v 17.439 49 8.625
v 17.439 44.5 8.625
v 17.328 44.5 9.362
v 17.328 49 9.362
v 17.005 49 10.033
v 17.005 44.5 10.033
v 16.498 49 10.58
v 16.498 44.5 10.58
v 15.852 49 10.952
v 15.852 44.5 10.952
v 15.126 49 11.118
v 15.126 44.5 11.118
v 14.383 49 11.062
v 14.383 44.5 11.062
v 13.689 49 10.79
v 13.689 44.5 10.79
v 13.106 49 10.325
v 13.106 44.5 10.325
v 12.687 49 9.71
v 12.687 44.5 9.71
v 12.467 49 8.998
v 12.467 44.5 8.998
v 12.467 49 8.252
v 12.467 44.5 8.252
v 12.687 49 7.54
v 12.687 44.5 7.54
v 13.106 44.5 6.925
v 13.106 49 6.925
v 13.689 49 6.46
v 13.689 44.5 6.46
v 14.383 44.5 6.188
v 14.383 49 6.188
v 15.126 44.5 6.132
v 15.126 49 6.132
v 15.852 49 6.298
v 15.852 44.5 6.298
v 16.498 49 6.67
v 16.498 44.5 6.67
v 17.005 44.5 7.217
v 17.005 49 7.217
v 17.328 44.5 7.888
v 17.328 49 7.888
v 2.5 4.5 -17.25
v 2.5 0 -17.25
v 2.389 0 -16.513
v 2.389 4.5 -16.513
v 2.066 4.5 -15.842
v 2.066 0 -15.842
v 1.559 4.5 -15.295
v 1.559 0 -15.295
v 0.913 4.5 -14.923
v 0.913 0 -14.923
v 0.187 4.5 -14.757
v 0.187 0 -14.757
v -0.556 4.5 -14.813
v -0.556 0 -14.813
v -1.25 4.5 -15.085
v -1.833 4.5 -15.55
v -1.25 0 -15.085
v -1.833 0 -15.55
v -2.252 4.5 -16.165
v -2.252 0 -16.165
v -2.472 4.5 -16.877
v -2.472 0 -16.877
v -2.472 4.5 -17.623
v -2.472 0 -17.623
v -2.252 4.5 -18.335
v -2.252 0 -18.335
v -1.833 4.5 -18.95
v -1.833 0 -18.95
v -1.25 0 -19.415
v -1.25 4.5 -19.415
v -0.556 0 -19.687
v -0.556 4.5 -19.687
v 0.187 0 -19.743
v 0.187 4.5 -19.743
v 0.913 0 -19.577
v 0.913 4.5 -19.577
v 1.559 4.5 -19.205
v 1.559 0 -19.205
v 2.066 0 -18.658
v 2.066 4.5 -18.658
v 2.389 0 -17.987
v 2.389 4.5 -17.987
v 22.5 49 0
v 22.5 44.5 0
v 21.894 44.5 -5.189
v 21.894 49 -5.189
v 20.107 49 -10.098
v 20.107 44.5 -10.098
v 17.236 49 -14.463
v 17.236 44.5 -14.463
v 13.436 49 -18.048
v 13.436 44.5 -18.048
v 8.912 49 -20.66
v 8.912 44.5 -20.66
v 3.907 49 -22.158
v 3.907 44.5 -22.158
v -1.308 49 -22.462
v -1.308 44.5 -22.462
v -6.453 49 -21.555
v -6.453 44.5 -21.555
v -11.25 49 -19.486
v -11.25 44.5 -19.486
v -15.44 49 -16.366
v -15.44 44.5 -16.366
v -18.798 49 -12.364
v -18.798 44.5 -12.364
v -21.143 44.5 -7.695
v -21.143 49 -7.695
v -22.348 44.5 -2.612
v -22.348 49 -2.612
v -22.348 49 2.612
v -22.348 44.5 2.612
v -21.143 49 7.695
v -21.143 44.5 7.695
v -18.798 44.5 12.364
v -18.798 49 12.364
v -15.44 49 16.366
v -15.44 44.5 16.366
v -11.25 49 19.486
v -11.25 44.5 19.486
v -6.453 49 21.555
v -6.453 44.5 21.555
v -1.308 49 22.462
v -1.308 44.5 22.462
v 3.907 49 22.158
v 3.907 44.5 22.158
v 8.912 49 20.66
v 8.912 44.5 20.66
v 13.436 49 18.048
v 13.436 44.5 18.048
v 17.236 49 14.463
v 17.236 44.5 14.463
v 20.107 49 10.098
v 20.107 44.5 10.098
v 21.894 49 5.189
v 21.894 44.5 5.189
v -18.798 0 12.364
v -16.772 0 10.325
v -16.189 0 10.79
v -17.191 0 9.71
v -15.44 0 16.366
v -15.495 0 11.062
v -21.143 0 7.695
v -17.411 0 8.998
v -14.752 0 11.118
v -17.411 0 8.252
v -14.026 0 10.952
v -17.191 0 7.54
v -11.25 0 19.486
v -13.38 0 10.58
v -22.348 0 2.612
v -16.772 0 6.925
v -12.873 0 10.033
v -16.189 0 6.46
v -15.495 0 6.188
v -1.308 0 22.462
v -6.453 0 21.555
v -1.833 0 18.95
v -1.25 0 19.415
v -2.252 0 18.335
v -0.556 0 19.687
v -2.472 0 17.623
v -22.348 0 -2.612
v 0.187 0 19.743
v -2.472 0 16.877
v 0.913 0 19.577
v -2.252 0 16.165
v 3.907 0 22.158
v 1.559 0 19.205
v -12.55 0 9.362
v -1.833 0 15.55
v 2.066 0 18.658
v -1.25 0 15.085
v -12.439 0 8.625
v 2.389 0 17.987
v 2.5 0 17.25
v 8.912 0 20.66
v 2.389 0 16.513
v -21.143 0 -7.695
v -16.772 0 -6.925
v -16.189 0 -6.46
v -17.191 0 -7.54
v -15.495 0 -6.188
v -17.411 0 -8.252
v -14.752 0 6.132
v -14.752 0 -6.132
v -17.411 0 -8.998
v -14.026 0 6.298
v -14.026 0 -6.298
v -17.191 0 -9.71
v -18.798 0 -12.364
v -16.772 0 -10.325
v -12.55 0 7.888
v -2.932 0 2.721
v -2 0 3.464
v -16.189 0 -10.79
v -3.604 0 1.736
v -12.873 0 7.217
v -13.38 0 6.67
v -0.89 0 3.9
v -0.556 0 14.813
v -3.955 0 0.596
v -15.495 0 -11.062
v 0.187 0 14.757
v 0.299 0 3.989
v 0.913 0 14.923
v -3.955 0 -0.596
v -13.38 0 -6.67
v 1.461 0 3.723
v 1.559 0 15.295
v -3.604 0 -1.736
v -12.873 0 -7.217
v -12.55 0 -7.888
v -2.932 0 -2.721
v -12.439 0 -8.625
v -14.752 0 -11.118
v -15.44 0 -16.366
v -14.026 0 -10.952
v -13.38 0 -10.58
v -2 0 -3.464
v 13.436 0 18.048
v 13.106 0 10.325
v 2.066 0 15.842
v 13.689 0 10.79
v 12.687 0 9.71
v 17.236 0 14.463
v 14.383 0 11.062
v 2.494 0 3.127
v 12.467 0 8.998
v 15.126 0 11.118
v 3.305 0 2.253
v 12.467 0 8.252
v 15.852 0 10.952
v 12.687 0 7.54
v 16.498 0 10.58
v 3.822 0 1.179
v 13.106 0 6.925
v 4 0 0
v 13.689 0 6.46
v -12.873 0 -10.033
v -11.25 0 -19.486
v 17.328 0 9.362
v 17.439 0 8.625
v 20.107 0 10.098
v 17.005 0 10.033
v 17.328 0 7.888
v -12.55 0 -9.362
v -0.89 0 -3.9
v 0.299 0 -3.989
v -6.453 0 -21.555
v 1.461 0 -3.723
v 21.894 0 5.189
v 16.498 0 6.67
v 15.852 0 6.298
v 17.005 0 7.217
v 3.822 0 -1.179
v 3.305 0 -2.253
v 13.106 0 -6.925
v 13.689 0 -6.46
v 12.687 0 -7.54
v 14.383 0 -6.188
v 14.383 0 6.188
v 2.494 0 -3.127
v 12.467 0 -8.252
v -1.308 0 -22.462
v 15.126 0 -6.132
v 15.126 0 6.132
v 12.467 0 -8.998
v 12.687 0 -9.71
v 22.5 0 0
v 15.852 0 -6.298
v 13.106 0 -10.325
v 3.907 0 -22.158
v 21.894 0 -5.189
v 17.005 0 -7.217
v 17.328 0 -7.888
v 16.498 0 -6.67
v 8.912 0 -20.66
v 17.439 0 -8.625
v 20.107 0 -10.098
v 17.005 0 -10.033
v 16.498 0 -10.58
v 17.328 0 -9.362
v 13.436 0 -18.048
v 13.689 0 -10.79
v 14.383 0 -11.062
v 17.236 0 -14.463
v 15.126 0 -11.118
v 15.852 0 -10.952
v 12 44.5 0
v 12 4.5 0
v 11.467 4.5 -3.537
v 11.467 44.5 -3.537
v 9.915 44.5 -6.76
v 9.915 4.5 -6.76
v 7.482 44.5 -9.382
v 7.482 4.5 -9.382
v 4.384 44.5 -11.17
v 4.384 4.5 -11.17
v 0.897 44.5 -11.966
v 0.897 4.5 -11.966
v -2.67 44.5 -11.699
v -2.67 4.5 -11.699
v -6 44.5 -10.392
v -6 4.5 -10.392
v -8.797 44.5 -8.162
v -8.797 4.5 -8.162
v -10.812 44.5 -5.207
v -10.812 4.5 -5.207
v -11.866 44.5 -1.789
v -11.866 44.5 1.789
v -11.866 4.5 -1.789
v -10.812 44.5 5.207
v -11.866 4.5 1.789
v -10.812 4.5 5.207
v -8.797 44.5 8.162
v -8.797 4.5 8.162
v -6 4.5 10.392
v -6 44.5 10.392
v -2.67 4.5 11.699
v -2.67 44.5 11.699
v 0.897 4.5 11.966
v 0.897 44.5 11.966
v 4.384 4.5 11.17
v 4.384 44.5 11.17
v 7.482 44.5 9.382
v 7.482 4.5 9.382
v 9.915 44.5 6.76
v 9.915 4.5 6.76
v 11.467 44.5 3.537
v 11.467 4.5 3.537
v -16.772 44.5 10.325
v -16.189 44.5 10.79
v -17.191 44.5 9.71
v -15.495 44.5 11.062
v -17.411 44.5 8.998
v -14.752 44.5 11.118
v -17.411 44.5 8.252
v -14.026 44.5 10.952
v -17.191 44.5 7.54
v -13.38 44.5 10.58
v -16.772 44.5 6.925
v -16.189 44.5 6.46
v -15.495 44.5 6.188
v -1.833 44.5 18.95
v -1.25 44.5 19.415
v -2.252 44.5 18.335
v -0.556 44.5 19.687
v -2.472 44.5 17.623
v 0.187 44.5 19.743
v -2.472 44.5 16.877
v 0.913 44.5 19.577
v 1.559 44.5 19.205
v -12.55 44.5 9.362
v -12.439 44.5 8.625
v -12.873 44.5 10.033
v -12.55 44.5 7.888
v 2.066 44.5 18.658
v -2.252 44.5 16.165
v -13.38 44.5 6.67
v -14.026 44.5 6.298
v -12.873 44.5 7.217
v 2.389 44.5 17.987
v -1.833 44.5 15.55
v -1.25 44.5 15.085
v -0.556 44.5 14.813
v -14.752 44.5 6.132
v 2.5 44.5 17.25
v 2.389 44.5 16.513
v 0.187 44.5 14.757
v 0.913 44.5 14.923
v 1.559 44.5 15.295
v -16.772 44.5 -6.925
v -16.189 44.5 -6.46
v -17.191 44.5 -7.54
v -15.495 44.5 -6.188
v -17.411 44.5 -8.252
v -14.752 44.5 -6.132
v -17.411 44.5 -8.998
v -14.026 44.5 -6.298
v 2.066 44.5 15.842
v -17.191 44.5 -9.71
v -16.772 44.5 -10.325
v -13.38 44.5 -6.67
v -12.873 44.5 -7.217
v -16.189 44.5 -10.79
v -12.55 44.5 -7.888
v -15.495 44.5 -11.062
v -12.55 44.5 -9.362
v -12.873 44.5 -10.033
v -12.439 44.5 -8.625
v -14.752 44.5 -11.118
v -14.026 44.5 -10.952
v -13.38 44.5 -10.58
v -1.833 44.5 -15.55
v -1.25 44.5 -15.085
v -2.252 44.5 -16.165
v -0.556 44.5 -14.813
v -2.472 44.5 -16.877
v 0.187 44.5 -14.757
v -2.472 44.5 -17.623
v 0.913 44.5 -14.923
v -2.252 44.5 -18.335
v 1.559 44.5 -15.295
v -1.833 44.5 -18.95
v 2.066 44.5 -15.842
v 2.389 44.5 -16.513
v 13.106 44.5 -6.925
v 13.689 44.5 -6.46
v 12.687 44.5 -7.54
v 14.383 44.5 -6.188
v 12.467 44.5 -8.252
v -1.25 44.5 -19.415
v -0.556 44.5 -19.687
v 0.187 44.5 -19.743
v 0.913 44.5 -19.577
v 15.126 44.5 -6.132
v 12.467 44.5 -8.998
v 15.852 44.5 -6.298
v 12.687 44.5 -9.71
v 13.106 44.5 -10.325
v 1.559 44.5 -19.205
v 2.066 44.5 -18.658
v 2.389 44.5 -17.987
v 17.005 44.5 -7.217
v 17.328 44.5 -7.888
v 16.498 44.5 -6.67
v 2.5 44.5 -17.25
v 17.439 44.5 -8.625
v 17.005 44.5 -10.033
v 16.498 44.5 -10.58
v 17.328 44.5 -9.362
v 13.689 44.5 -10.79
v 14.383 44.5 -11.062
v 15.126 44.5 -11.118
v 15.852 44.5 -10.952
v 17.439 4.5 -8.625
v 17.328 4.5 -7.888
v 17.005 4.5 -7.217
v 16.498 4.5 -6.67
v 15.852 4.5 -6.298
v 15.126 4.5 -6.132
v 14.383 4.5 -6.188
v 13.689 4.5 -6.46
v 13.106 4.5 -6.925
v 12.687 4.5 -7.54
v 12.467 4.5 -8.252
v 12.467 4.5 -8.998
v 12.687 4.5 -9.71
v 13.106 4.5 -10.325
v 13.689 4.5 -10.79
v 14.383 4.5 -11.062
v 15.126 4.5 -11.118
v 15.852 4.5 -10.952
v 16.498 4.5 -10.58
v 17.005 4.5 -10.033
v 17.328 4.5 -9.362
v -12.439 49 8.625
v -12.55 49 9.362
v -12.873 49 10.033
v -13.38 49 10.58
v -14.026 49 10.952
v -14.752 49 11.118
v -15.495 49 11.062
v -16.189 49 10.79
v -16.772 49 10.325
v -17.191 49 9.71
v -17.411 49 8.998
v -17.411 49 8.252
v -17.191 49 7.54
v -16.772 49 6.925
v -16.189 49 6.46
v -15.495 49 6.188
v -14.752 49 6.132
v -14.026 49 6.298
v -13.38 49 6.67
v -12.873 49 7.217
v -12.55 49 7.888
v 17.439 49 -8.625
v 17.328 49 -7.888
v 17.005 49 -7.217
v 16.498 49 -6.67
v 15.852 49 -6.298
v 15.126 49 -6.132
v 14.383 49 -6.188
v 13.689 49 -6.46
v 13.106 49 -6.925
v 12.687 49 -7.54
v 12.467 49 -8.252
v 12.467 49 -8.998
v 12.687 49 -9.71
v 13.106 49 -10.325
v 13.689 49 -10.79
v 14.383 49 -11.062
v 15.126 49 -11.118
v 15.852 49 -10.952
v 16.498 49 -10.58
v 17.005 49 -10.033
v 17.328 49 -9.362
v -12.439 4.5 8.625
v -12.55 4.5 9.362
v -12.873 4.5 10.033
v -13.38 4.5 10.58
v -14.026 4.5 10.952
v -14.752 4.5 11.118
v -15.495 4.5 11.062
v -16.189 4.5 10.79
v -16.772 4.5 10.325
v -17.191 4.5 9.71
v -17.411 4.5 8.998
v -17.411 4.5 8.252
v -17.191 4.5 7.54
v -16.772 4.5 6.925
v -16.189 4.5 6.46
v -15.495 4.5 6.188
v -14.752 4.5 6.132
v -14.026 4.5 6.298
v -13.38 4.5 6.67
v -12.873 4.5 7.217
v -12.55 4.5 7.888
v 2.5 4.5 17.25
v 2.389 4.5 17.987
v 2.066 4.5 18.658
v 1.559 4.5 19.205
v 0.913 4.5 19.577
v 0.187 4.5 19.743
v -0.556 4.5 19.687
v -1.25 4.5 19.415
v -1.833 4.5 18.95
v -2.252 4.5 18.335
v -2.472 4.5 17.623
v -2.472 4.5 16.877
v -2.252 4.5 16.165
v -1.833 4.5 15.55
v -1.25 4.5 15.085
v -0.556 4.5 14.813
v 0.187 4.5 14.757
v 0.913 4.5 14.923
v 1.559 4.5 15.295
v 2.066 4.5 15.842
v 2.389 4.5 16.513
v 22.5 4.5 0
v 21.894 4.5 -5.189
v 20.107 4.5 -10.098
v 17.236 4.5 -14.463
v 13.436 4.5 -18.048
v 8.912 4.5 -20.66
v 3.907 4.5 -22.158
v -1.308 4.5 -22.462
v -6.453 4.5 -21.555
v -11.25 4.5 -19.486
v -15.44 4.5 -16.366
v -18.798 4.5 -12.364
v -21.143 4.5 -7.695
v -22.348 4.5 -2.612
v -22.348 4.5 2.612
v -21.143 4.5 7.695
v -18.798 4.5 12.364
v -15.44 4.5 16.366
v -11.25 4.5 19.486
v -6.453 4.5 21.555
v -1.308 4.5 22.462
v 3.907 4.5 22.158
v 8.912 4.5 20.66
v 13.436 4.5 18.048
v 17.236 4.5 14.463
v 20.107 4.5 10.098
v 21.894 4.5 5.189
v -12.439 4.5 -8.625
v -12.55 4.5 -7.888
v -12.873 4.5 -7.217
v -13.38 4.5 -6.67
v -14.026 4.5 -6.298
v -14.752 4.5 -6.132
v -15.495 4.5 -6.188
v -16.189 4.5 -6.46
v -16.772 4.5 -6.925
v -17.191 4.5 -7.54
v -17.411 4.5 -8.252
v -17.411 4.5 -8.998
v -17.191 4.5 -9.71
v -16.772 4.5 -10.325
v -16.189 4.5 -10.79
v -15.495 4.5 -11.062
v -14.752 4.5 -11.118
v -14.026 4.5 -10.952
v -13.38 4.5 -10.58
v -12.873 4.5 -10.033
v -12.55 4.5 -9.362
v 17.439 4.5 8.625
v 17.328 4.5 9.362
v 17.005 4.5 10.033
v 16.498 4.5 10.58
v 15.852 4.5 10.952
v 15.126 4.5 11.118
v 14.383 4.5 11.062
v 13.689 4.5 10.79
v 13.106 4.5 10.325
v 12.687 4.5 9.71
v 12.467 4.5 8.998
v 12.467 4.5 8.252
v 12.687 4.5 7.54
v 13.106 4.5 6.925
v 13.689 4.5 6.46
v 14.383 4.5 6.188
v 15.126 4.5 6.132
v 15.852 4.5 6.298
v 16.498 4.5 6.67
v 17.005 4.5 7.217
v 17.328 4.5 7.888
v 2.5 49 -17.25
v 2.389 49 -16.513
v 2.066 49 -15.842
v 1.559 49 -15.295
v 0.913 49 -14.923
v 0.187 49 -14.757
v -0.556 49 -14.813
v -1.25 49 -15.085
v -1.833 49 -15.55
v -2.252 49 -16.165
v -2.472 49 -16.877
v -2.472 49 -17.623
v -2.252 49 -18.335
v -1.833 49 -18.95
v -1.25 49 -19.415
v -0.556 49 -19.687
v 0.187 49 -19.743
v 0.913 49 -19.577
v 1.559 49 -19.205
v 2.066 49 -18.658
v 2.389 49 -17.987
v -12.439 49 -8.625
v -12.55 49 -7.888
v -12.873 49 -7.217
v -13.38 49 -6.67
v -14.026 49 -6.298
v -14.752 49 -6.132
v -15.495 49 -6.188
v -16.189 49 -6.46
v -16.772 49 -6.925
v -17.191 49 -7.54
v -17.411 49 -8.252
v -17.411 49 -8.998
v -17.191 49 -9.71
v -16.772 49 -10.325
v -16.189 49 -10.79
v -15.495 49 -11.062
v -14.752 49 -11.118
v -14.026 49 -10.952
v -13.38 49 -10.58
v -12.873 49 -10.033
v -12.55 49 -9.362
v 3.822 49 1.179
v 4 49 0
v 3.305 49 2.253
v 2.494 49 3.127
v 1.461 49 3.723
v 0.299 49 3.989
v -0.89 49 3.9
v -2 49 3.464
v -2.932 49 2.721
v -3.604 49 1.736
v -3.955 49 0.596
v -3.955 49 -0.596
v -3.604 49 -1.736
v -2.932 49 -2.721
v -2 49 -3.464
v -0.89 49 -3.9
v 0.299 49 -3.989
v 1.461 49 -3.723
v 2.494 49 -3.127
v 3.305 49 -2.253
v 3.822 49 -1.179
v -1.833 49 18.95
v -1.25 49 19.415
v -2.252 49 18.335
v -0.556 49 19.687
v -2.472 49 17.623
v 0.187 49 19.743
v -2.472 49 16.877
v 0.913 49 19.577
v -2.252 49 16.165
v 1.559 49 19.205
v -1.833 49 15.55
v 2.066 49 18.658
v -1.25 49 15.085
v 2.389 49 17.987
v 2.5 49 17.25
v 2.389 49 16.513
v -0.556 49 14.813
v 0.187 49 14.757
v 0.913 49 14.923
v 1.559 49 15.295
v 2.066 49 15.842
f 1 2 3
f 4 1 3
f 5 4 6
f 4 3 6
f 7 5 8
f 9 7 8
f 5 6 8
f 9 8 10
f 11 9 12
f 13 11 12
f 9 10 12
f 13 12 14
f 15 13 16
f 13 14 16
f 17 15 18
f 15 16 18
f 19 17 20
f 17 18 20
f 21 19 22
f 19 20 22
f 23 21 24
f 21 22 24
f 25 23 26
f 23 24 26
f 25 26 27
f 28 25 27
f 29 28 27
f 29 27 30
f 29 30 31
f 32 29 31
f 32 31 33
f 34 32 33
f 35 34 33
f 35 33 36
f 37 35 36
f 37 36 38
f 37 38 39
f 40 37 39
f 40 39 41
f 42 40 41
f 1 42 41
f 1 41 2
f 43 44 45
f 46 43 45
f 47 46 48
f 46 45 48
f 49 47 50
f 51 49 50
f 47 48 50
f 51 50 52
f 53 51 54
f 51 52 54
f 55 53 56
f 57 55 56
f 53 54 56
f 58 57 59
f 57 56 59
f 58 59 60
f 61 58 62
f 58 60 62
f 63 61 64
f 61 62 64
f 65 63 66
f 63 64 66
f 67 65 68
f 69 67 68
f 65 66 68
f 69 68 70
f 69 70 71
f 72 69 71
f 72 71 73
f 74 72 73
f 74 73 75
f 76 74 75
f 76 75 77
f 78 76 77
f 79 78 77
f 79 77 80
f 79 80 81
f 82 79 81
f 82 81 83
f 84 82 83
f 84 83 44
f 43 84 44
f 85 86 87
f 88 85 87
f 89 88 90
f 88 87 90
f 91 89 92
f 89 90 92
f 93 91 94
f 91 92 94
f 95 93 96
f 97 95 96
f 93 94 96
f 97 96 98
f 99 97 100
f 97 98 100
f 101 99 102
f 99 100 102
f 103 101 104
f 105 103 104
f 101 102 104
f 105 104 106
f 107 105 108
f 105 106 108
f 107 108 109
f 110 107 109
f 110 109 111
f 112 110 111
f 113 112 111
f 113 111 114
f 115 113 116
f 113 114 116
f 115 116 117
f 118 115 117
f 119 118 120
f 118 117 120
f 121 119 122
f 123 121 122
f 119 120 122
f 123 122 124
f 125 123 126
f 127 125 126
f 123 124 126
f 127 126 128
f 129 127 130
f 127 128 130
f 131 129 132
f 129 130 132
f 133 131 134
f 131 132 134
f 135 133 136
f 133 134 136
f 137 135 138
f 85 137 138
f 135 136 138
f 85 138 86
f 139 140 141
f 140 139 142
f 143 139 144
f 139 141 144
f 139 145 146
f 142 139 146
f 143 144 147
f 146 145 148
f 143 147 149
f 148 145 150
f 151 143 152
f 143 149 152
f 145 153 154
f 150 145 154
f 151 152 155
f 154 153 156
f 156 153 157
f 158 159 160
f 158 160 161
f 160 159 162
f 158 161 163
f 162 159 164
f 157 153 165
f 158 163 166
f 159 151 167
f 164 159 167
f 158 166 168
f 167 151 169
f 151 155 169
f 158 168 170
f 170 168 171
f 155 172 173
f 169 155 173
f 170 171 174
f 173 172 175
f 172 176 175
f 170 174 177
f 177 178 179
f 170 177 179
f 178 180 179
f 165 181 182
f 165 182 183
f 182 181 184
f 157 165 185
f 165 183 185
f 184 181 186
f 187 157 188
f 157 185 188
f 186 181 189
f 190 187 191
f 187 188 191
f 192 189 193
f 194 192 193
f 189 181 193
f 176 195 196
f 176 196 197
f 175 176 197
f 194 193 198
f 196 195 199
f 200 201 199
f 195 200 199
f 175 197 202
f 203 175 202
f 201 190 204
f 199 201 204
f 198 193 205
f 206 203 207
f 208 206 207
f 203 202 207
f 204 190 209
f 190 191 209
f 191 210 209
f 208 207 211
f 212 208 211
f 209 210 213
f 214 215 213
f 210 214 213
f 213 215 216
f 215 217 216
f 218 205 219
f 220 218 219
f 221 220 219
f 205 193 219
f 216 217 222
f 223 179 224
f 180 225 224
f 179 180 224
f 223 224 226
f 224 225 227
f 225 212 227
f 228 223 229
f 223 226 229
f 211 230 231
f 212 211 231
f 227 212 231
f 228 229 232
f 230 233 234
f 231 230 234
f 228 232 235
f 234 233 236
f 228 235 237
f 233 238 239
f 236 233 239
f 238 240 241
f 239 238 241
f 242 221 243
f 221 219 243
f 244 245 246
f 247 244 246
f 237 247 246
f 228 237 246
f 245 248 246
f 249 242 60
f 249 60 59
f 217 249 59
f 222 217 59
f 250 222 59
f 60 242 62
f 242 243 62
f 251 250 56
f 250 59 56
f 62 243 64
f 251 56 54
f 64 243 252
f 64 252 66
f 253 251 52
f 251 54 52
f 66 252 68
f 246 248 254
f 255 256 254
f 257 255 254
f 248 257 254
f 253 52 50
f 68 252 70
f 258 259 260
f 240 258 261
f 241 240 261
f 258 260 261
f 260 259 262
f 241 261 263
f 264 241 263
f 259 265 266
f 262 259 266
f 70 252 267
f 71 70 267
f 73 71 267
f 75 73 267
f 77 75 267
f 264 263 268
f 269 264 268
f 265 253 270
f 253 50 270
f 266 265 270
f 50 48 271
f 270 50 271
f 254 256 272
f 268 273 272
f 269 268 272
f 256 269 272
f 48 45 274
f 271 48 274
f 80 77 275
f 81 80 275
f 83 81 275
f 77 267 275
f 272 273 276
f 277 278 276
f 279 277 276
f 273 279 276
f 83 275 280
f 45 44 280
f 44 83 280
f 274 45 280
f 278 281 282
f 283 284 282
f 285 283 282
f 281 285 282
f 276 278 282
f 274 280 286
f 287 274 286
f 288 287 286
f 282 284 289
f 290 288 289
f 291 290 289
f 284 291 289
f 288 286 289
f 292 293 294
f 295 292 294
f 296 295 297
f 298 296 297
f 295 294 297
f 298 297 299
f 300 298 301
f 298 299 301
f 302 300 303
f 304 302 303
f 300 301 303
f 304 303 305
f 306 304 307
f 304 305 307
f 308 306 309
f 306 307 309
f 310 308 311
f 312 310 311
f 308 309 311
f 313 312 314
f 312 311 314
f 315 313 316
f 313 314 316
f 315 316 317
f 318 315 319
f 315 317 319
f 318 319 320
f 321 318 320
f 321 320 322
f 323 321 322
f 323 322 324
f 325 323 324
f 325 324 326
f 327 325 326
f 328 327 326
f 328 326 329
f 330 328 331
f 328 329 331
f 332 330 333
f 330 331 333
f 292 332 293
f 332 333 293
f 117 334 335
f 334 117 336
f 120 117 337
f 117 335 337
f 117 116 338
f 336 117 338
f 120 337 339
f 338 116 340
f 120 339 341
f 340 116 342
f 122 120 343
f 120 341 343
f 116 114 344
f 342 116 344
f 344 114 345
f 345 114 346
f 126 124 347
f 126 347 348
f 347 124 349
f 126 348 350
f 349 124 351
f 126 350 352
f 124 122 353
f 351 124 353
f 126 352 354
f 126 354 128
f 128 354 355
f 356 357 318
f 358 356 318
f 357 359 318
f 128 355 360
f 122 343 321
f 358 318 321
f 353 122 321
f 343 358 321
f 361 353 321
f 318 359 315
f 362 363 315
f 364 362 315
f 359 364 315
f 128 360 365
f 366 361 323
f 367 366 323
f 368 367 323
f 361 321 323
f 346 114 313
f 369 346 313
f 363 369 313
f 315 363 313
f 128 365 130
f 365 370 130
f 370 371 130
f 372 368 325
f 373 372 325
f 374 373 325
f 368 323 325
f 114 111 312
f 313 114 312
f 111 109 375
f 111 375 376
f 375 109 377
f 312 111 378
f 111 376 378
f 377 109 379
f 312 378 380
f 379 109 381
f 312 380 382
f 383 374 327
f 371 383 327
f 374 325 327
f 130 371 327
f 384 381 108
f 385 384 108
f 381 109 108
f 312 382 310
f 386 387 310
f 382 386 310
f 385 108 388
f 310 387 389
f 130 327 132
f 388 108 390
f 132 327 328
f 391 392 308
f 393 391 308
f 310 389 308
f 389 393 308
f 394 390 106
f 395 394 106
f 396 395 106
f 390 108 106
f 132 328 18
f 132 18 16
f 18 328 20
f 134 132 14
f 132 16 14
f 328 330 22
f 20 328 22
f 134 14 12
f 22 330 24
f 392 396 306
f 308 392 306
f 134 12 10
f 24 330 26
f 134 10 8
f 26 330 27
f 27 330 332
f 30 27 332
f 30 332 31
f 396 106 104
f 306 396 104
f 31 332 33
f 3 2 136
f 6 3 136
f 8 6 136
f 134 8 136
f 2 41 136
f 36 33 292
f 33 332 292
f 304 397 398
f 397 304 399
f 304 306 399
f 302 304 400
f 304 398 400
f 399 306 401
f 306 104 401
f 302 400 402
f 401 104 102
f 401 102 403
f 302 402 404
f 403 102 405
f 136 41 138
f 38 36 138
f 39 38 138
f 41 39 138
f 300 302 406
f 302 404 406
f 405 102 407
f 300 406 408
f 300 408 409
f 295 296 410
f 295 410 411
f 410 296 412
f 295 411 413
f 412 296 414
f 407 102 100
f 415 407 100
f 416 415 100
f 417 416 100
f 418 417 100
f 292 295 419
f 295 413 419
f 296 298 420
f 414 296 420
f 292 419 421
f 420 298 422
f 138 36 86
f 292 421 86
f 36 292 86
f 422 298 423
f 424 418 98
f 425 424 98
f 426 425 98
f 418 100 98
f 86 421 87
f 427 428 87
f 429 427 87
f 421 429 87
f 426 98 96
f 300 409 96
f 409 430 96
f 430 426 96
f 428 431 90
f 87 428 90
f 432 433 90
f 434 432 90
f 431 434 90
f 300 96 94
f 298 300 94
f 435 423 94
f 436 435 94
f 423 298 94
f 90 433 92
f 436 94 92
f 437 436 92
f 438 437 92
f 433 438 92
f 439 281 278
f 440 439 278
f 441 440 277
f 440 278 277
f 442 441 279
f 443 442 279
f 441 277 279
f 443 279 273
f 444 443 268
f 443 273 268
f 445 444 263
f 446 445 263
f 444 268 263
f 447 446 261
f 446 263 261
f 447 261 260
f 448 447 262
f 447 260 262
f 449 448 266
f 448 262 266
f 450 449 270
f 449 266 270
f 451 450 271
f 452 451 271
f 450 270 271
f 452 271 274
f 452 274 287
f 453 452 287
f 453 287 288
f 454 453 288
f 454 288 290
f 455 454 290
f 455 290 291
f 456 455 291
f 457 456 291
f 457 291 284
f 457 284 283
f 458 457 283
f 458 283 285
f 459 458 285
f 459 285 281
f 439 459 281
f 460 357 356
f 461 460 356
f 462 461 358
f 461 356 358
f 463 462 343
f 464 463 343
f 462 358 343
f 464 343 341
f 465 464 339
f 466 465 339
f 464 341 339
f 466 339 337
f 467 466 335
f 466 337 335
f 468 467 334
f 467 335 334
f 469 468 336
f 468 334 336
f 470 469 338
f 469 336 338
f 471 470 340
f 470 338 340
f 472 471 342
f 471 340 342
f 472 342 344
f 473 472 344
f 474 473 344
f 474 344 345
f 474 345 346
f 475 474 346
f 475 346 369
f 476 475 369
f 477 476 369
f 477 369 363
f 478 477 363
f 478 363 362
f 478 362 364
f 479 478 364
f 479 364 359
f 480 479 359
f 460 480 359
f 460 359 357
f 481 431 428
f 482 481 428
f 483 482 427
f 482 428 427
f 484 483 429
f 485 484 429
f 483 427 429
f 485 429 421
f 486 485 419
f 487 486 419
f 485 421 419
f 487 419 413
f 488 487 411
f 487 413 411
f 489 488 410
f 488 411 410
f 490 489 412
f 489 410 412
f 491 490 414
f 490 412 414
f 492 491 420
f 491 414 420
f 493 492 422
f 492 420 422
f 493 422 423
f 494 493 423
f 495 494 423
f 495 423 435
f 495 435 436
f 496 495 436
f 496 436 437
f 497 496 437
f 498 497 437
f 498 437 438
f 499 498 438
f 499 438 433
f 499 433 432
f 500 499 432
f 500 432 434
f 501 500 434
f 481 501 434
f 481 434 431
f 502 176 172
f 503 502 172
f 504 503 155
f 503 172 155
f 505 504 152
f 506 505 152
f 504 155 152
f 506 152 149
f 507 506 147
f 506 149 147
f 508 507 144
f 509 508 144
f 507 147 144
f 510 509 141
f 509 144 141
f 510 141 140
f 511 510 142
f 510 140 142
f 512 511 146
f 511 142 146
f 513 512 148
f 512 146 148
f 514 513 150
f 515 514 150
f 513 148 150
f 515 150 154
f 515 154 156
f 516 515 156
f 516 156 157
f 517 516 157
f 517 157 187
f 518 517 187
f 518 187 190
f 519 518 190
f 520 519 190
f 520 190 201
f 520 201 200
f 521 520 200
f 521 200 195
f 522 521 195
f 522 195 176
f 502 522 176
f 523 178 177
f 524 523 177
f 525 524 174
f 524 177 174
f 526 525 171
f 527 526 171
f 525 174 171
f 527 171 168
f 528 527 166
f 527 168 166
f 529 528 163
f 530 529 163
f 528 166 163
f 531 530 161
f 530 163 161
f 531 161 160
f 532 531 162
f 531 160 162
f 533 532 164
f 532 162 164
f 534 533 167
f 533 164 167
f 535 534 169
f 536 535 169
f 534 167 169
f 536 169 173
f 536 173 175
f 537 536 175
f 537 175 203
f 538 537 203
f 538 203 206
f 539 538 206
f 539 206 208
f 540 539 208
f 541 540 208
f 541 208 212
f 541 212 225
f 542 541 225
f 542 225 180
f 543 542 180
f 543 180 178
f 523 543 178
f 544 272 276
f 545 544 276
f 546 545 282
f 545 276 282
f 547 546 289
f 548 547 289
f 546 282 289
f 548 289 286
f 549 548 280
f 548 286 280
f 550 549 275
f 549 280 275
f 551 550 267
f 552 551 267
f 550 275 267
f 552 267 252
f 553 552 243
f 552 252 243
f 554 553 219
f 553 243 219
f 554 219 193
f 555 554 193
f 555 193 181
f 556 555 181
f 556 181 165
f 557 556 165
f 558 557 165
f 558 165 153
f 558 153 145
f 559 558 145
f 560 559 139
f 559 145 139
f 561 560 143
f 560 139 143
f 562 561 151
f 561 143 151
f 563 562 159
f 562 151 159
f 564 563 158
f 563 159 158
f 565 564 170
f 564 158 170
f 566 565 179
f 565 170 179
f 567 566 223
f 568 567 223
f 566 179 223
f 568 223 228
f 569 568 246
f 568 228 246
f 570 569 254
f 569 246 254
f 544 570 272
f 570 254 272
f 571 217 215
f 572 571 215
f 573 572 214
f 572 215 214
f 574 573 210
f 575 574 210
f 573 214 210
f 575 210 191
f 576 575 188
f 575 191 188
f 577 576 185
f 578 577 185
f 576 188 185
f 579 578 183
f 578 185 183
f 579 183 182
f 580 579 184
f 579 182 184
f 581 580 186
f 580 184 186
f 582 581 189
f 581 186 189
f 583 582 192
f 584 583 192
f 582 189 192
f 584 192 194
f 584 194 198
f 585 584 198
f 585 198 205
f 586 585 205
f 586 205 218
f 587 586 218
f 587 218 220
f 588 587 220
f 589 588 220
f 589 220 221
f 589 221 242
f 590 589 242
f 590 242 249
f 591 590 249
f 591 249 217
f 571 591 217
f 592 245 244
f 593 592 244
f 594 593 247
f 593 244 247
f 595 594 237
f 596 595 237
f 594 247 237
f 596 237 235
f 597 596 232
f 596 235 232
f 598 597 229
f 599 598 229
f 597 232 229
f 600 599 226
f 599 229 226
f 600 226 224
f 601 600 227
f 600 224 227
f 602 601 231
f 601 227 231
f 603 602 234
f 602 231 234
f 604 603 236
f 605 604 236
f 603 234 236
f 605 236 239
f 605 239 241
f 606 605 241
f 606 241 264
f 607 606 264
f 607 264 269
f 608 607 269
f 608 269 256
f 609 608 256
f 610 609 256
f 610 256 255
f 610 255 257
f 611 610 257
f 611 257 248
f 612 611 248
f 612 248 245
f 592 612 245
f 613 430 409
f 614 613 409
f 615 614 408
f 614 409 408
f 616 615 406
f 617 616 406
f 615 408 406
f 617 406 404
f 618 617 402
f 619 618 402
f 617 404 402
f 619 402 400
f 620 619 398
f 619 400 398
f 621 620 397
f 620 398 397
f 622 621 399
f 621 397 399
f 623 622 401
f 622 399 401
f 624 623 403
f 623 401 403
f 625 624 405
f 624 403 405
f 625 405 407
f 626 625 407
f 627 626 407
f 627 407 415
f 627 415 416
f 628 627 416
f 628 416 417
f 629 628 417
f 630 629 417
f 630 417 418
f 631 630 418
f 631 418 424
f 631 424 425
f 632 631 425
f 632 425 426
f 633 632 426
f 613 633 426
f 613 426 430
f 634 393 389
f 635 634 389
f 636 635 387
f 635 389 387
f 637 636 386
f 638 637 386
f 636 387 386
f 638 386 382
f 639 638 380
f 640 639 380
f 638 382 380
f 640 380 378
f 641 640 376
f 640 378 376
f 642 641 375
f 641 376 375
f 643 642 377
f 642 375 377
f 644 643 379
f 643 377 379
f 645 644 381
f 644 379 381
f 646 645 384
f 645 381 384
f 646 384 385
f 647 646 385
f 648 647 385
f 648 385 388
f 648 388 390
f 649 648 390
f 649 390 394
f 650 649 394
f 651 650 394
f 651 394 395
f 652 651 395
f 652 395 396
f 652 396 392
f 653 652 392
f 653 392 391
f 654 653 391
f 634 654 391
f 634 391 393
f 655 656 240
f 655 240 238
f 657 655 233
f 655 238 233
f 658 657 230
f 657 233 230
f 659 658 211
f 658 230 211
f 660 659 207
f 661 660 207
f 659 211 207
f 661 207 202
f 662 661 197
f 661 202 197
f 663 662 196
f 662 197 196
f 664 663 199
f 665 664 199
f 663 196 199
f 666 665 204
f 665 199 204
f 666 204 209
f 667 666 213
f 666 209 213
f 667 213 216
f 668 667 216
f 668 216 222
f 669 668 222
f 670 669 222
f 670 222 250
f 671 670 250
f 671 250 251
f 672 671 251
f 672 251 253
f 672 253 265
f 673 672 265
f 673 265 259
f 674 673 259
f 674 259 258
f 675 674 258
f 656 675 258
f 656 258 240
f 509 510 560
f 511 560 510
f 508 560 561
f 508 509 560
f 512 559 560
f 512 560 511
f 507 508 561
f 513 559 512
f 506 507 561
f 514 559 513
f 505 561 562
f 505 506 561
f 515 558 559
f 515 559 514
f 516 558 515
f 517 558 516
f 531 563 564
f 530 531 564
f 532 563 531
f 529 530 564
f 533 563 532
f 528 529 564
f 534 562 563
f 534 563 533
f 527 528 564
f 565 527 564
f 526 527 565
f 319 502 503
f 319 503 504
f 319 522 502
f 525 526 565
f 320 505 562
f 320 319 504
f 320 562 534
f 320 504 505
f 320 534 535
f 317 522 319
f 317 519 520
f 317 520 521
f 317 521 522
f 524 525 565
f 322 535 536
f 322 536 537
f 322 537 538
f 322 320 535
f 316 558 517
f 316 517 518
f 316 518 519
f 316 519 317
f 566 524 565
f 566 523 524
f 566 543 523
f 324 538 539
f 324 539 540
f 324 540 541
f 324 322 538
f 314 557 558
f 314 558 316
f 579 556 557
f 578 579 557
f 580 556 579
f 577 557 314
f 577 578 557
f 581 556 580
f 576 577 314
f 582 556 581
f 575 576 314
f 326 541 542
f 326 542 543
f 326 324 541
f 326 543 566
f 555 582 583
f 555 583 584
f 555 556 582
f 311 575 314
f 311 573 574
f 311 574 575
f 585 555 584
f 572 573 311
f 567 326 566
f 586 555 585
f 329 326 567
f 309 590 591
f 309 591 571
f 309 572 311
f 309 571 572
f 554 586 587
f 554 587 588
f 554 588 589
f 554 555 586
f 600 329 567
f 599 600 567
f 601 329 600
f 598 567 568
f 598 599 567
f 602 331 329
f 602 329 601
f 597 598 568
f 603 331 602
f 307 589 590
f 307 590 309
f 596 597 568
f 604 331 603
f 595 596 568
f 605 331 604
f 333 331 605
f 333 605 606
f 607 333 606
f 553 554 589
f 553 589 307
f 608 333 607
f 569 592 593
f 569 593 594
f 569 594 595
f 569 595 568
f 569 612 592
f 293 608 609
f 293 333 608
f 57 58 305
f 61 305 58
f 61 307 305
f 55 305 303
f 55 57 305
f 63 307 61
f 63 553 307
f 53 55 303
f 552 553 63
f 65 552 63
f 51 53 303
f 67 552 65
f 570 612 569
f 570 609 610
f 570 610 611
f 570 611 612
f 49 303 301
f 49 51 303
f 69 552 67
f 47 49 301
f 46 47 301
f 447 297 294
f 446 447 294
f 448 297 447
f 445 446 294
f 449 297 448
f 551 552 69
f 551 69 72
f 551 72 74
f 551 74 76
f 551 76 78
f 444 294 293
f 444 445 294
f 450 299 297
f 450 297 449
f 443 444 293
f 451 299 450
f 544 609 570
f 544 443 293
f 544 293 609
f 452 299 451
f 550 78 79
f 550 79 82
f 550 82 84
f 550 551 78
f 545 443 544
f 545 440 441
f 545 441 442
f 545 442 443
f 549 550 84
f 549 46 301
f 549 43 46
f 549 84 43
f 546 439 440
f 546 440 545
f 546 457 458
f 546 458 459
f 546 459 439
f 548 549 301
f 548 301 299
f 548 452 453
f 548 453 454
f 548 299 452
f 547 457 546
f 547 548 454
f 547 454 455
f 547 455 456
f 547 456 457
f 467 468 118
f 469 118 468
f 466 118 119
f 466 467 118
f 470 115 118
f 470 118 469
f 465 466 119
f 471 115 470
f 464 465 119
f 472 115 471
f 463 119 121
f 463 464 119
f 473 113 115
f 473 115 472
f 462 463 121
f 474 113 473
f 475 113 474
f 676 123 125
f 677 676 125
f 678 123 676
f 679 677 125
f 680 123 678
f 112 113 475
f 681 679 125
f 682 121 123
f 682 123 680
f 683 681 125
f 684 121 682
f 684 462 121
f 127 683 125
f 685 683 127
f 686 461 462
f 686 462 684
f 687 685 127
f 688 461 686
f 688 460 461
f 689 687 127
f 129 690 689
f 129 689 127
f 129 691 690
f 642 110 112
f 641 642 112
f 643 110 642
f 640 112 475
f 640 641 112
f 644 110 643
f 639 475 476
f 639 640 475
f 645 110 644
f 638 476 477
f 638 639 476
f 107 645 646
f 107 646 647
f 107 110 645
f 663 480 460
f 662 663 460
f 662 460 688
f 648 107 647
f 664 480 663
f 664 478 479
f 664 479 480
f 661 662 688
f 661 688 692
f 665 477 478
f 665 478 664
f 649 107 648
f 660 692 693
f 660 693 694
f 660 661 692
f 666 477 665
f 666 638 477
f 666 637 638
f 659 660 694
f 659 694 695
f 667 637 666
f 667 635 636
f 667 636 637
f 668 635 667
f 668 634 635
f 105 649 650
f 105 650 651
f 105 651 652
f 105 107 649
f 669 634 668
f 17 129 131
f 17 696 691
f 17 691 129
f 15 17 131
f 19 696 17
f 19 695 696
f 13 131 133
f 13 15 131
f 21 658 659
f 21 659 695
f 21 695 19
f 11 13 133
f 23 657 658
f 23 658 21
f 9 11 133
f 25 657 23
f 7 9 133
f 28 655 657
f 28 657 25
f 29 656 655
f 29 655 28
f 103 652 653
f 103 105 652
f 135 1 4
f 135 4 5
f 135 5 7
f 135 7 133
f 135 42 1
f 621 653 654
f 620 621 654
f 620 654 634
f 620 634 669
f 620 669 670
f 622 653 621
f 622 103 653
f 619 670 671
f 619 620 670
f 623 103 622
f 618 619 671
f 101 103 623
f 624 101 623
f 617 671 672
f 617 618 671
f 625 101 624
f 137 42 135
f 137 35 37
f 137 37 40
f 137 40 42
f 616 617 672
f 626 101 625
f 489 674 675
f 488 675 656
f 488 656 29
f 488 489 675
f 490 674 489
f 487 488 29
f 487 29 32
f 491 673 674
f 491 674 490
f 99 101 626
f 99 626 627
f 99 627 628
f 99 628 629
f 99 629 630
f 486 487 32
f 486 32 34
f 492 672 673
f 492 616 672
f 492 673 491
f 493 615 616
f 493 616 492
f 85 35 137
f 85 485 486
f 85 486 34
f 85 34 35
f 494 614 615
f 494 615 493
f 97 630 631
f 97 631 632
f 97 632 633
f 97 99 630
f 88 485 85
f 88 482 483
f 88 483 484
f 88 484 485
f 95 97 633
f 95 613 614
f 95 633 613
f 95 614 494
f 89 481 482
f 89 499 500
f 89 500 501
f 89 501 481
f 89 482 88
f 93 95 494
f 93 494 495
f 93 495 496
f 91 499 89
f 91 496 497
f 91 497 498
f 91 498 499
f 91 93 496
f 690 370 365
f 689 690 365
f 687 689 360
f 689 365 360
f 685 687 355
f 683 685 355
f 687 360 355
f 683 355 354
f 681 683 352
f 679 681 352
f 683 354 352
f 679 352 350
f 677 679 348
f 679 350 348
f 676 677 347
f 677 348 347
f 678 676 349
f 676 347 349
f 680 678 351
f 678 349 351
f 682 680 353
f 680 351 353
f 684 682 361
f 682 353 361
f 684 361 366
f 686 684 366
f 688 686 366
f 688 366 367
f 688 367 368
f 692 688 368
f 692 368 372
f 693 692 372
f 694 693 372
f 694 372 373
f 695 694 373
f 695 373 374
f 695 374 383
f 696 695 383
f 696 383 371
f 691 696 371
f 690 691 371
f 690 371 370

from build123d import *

# Parameters (mm, degrees)
SKETCH1_R           = 22.5
BOSS_EXTRUDE1_DEPTH = 4.5
SKETCH2_R           = 12
BOSS_EXTRUDE2_DEPTH = 40
SKETCH3_R           = 22.5
BOSS_EXTRUDE3_DEPTH = 4.5
SKETCH4_R           = 4
CUT_EXTRUDE1_DEPTH  = 60.5
SKETCH5_R           = 2.5
CUT_EXTRUDE2_DEPTH  = 60.5


with BuildPart() as part:
    # Sketch1 → Boss-Extrude1 (new body)
    with BuildSketch(Plane(origin=(0, 0, 0), x_dir=(1, 0, 0), z_dir=(0, 1, 0))):
        Circle(SKETCH1_R)
    extrude(amount=BOSS_EXTRUDE1_DEPTH)

    # Sketch2 → Boss-Extrude2 (add)
    with BuildSketch(Plane(origin=(0, 4.5, 0), x_dir=(1, 0, 0), z_dir=(0, 1, 0))):
        Circle(SKETCH2_R)
    extrude(amount=BOSS_EXTRUDE2_DEPTH)

    # Sketch3 → Boss-Extrude3 (add)
    with BuildSketch(Plane(origin=(0, 44.5, 0), x_dir=(1, 0, 0), z_dir=(0, 1, 0))):
        Circle(SKETCH3_R)
    extrude(amount=BOSS_EXTRUDE3_DEPTH)

    # Sketch4 → Cut-Extrude1 (cut)
    with BuildSketch(Plane.XZ):
        Circle(SKETCH4_R)
    extrude(amount=-CUT_EXTRUDE1_DEPTH, mode=Mode.SUBTRACT)

    # Sketch5 → Cut-Extrude2 (cut)
    with BuildSketch(Plane.XZ):
        with Locations((0, 17.25)):
            Circle(SKETCH5_R)
        with Locations((14.938938215, 8.625)):
            Circle(SKETCH5_R)
        with Locations((14.938938215, -8.625)):
            Circle(SKETCH5_R)
        with Locations((0, -17.25)):
            Circle(SKETCH5_R)
        with Locations((-14.938938215, -8.625)):
            Circle(SKETCH5_R)
        with Locations((-14.938938215, 8.625)):
            Circle(SKETCH5_R)
    extrude(amount=-CUT_EXTRUDE2_DEPTH, mode=Mode.SUBTRACT)


solid = part.part
